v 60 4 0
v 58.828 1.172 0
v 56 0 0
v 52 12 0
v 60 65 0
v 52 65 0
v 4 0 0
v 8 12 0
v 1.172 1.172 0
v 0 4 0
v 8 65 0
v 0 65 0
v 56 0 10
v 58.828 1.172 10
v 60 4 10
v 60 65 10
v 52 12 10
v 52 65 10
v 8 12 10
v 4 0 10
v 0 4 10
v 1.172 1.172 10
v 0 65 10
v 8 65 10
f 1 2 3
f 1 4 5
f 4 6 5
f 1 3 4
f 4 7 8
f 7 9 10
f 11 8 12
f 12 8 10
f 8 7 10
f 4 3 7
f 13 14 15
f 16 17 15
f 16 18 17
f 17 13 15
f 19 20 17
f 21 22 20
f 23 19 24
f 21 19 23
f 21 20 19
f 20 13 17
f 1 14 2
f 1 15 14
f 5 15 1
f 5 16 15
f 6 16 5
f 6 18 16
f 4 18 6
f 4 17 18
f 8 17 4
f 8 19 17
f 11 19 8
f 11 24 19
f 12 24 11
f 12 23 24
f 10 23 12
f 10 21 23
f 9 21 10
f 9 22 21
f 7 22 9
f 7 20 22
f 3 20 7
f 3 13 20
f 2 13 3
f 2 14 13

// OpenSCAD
$fn = 32;

// ----------------------------------------------------------------------
// Heat sink frame: 60 x 65 mm frame, 8 mm walls
// ----------------------------------------------------------------------

// --- parameters (mm) ---
profile_height = 10;      // extrusion height
profile_points = 12;      // points of the closed outline

profile = [[0, 4], [1.172, 1.172], [4, 0], [56, 0], [58.828, 1.172], [60, 4], [60, 65], [52, 65], [52, 12], [8, 12], [8, 65], [0, 65]];  // single closed polygon, 12 points, counter clockwise

// --- the one profile operation ---
linear_extrude(height = profile_height) polygon(points = profile);
